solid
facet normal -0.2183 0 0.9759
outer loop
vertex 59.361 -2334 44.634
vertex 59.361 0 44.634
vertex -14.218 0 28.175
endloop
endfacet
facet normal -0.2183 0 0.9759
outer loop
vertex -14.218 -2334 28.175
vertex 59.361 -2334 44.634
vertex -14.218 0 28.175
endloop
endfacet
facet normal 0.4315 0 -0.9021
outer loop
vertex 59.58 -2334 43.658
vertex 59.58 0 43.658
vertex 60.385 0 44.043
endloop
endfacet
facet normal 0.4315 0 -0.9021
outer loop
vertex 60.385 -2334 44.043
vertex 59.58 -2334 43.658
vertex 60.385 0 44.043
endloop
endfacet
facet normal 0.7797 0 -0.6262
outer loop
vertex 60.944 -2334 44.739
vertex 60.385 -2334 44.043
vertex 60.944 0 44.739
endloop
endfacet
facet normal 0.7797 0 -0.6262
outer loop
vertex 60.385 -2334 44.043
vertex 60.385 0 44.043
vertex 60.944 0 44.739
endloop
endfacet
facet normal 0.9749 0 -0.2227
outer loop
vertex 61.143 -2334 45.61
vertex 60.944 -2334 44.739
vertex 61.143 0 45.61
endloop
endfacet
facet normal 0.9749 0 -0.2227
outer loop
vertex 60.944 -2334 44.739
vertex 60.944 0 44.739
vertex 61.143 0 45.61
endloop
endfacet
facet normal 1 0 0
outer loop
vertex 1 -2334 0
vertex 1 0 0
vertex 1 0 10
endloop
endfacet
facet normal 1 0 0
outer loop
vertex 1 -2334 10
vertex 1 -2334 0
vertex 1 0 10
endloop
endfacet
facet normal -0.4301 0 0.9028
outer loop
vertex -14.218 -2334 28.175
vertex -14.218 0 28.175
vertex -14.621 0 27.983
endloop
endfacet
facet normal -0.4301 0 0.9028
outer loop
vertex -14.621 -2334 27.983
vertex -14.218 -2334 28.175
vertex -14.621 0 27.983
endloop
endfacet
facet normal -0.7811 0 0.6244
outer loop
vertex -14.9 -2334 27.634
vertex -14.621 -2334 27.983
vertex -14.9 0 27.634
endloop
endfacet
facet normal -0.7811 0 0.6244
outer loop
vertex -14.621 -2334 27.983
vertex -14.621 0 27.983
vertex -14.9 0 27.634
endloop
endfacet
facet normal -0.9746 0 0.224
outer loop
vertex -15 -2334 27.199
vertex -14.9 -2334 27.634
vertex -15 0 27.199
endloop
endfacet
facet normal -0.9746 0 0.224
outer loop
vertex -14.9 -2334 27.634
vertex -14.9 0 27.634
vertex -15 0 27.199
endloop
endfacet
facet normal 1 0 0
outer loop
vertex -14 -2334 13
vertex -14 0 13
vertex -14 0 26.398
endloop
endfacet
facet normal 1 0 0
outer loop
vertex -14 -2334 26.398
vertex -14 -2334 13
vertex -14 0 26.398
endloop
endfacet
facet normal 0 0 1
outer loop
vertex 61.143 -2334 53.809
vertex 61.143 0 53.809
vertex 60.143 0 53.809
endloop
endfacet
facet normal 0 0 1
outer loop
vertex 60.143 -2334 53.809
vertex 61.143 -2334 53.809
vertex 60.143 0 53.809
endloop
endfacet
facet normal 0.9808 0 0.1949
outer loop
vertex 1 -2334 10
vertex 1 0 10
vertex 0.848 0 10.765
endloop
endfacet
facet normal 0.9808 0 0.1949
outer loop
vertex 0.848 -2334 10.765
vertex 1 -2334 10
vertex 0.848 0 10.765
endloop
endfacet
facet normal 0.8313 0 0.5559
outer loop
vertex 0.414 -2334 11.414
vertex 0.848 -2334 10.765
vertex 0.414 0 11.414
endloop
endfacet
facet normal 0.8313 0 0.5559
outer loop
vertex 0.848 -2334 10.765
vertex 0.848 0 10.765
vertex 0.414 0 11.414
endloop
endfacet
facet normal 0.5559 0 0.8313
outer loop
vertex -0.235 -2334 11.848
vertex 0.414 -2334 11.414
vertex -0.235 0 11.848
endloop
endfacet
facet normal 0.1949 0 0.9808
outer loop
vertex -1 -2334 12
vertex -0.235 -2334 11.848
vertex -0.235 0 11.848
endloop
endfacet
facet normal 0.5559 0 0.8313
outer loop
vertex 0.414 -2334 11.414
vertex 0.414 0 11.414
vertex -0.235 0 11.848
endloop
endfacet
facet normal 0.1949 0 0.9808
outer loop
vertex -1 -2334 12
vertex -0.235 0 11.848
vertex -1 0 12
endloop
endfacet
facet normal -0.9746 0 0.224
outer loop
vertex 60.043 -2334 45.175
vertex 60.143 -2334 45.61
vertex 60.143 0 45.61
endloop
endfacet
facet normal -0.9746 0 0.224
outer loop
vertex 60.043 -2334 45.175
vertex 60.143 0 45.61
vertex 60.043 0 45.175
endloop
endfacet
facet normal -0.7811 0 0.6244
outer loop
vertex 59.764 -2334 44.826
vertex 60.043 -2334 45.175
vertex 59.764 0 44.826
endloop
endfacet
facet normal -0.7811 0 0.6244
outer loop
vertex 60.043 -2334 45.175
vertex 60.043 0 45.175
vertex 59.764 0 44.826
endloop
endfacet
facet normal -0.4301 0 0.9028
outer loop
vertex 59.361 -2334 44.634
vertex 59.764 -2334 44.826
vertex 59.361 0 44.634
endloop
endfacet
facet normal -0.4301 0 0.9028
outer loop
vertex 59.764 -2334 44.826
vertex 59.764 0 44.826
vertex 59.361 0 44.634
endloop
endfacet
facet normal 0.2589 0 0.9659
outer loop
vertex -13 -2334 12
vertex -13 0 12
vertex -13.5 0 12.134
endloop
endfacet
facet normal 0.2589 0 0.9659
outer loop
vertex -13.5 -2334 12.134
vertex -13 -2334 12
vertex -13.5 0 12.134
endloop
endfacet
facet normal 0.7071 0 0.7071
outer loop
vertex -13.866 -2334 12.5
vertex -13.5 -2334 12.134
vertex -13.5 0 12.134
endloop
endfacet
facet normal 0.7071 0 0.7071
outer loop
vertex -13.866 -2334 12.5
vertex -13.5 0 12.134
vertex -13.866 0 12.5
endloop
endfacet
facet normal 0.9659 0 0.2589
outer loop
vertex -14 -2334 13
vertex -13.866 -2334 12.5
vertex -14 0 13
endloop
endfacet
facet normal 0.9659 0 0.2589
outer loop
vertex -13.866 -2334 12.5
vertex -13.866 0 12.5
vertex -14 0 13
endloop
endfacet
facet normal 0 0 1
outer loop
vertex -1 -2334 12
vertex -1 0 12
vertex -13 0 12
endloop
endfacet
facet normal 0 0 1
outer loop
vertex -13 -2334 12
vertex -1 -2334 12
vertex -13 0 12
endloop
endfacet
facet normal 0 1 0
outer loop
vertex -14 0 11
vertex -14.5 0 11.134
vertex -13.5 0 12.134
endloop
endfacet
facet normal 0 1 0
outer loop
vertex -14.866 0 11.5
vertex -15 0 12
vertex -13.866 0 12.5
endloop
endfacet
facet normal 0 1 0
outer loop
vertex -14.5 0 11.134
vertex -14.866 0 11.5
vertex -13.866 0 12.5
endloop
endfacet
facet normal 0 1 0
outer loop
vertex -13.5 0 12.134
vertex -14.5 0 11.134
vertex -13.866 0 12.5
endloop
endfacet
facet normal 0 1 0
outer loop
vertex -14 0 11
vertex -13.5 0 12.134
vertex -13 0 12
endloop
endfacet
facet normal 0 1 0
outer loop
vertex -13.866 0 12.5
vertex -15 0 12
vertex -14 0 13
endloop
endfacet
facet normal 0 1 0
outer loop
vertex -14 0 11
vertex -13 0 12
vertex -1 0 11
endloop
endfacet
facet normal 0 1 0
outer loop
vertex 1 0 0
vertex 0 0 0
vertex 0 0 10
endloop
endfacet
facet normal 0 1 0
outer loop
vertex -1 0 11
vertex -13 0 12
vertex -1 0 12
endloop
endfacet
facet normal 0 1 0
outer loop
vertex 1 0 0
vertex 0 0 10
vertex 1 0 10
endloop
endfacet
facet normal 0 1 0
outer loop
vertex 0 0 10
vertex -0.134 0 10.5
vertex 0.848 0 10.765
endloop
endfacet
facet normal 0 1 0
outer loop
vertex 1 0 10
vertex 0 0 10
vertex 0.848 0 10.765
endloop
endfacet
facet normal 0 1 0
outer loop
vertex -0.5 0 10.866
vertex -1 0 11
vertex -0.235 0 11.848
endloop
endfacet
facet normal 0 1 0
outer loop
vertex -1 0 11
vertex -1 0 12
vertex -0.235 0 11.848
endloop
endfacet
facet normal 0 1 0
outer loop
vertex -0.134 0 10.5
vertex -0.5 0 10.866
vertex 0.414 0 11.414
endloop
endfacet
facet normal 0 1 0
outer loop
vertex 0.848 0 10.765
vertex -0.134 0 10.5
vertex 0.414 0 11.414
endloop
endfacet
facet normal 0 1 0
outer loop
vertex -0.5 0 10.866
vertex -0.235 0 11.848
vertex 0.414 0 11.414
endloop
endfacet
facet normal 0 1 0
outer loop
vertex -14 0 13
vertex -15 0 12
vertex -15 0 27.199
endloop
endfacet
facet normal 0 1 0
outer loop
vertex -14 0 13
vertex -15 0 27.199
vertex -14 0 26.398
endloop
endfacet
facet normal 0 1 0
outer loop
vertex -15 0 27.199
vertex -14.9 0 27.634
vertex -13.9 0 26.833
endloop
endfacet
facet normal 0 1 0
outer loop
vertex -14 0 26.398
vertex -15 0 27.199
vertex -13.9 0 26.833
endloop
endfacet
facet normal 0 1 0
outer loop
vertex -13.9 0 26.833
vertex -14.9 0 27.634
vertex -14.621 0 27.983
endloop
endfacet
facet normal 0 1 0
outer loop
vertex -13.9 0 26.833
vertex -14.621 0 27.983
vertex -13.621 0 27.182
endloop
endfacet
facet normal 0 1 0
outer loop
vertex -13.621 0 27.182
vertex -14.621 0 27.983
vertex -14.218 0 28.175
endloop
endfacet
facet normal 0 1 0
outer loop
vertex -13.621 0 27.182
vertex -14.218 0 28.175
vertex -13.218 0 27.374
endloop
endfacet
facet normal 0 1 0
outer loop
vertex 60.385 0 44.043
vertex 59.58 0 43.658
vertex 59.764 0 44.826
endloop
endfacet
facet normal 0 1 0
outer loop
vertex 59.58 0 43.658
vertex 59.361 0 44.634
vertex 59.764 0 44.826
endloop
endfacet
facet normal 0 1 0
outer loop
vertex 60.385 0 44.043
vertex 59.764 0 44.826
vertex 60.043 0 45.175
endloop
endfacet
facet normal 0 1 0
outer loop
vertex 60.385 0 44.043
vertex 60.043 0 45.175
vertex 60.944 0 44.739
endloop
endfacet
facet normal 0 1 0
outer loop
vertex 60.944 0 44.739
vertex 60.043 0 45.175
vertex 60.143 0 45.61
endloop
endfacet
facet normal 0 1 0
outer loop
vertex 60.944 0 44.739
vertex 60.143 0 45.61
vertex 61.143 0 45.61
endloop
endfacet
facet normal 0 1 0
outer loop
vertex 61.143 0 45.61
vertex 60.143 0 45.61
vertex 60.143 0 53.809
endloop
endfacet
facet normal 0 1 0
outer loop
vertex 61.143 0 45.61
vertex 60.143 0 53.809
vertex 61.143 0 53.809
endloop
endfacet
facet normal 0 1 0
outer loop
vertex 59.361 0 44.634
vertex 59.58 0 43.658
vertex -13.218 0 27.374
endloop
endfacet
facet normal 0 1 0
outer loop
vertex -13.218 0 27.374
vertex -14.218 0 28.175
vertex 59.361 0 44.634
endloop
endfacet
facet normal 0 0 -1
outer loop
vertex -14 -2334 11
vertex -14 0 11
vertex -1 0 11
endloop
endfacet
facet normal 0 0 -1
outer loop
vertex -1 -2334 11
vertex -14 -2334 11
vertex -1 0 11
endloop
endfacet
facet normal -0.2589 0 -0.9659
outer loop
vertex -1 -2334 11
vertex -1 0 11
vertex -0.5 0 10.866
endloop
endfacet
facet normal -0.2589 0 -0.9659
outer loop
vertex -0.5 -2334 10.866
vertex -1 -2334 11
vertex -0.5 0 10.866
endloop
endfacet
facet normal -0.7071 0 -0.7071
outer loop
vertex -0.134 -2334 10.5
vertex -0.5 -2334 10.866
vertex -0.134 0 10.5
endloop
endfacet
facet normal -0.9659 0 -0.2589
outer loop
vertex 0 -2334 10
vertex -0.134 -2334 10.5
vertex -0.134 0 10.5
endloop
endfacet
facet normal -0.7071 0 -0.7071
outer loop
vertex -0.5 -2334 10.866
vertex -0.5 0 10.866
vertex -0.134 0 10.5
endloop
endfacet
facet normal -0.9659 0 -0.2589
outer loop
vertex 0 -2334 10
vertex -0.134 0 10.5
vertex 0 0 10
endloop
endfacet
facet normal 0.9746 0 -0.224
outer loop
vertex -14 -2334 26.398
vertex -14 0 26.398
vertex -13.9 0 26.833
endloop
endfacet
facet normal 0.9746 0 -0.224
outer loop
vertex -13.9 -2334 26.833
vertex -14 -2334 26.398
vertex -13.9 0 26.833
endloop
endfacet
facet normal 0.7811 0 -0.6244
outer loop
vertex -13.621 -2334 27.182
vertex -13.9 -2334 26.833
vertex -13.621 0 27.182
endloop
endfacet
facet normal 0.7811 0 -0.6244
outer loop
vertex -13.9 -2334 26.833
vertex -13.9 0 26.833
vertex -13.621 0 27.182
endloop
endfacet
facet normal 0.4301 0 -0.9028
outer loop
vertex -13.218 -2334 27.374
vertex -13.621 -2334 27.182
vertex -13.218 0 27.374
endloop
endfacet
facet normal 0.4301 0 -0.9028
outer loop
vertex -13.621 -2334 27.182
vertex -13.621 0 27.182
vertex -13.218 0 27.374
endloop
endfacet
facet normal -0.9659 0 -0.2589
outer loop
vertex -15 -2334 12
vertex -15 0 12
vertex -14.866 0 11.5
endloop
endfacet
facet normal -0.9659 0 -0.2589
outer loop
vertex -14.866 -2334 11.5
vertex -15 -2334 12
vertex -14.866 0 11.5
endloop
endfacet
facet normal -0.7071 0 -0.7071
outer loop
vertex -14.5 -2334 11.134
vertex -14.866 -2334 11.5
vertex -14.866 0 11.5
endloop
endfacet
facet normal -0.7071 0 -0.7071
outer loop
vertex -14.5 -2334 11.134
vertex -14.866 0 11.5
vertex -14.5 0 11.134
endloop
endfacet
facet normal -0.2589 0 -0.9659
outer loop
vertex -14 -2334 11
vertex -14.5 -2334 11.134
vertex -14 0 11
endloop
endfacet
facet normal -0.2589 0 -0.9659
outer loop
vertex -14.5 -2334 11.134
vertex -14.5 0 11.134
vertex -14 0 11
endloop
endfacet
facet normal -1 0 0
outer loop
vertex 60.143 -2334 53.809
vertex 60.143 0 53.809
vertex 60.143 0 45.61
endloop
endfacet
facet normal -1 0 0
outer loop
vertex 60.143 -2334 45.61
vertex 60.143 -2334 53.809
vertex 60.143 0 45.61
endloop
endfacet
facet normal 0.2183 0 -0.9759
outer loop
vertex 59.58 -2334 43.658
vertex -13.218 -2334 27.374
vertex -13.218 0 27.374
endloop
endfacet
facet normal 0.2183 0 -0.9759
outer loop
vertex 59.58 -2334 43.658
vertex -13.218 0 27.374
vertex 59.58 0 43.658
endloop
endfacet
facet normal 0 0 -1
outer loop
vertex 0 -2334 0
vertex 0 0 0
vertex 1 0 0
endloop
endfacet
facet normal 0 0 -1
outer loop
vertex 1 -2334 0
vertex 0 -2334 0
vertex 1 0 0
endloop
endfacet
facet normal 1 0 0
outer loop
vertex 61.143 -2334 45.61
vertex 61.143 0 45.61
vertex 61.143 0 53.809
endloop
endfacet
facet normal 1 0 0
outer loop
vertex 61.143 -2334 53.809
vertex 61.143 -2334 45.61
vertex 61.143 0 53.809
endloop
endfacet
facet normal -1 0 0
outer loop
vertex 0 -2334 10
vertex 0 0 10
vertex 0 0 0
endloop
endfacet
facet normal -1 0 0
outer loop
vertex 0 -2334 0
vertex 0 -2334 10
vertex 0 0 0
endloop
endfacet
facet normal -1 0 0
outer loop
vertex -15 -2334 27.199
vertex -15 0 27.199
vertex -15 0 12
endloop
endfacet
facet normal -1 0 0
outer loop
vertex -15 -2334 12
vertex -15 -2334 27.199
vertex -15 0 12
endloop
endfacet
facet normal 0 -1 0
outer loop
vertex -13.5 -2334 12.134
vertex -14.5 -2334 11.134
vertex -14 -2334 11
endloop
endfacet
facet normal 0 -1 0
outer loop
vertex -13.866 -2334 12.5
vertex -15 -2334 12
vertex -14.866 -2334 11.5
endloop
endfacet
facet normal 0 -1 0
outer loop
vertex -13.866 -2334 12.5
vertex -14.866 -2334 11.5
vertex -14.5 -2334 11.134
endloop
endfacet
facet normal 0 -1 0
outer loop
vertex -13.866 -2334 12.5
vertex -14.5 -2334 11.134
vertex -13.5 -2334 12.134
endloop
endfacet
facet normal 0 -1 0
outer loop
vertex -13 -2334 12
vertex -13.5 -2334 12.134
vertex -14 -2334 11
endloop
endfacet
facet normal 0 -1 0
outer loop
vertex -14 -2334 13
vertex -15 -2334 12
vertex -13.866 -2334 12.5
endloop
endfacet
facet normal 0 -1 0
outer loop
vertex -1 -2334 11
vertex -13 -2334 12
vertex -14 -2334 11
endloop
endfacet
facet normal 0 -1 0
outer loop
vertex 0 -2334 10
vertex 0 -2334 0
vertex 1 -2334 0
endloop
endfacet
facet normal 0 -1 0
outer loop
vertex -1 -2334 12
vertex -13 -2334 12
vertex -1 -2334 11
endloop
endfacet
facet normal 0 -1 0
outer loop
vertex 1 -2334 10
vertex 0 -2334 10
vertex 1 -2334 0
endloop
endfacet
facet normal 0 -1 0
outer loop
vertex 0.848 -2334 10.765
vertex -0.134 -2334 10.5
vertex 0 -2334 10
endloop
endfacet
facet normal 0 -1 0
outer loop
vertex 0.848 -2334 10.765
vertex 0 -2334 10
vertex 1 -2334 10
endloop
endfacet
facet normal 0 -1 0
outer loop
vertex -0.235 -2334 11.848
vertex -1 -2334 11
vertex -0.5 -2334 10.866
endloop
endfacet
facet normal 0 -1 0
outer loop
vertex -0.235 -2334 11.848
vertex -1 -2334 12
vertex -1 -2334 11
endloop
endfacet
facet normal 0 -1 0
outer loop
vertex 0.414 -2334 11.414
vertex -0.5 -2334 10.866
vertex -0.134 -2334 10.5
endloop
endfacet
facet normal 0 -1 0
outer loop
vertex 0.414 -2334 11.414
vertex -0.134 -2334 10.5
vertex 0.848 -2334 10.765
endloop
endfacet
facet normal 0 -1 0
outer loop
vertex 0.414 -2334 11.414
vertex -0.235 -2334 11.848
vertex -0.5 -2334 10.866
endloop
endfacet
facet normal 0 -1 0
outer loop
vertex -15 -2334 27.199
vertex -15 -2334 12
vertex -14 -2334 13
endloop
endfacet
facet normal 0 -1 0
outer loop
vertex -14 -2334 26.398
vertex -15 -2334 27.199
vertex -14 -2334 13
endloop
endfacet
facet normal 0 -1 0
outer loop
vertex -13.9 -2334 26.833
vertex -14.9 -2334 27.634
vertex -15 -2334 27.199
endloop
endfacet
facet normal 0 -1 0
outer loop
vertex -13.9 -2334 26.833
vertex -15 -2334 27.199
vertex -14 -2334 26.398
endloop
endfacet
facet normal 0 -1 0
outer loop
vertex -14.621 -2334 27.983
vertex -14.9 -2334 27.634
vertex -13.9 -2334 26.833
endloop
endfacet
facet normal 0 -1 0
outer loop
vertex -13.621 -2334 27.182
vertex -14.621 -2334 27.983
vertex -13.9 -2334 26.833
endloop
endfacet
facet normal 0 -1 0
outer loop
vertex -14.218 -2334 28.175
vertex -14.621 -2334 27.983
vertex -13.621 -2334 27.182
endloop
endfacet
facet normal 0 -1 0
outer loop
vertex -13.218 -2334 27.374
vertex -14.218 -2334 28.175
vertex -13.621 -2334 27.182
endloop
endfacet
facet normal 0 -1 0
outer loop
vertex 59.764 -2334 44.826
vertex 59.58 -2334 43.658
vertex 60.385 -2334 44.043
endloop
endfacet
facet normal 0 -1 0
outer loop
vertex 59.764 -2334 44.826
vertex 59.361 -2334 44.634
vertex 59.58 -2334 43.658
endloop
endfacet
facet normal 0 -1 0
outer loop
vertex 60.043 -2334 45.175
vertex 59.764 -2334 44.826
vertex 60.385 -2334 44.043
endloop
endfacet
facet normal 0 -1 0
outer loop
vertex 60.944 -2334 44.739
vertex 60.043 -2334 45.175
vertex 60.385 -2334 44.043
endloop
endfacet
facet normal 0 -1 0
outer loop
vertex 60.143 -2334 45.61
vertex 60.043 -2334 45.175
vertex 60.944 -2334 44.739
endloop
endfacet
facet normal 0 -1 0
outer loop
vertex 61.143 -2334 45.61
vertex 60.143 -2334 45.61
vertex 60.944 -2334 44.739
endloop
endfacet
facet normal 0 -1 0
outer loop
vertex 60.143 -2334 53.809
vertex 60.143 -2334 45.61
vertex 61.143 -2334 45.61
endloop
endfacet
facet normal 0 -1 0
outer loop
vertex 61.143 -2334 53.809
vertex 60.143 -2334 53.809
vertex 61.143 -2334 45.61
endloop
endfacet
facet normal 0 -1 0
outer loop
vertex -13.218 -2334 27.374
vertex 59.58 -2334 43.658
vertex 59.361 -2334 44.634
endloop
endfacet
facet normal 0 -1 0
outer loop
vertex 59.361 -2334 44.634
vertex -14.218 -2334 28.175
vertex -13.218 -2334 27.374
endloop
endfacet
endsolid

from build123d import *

# Parameters (mm, degrees)
F1_DEPTH = 2334


with BuildPart() as f1:
    # F0 (on Front) → F1 (new body)
    with BuildSketch(Plane.XZ):
        with BuildLine():
            Line((0, 10), (0, 0))
            Line((0, 0), (1, 0))
            Line((1, 0), (1, 10))
            ThreePointArc((1, 10), (0.414214, 11.414214), (-1, 12))
            Line((-1, 12), (-13, 12))
            ThreePointArc((-13, 12), (-13.707107, 12.292893), (-14, 13))
            Line((-14, 13), (-14, 26.397954))
            ThreePointArc((-14, 26.397954), (-13.780479, 27.023135), (-13.218295, 27.373836))
            Line((-13.218295, 27.373836), (59.579564, 43.657993))
            ThreePointArc((59.579564, 43.657993), (60.703931, 44.359395), (61.142973, 45.609759))
            Line((61.142973, 45.609759), (61.142973, 53.808736))
            Line((61.142973, 53.808736), (60.142973, 53.808736))
            Line((60.142973, 53.808736), (60.142973, 45.609759))
            ThreePointArc((60.142973, 45.609759), (59.923452, 44.984577), (59.361268, 44.633876))
            Line((59.361268, 44.633876), (-14.218295, 28.17486))
            ThreePointArc((-14.218295, 28.17486), (-14.780479, 27.824159), (-15, 27.198977))
            Line((-15, 27.198977), (-15, 12))
            ThreePointArc((-15, 12), (-14.707107, 11.292893), (-14, 11))
            Line((-14, 11), (-1, 11))
            ThreePointArc((-1, 11), (-0.292893, 10.707107), (0, 10))
        make_face()
    extrude(amount=F1_DEPTH)


solid = f1.part
